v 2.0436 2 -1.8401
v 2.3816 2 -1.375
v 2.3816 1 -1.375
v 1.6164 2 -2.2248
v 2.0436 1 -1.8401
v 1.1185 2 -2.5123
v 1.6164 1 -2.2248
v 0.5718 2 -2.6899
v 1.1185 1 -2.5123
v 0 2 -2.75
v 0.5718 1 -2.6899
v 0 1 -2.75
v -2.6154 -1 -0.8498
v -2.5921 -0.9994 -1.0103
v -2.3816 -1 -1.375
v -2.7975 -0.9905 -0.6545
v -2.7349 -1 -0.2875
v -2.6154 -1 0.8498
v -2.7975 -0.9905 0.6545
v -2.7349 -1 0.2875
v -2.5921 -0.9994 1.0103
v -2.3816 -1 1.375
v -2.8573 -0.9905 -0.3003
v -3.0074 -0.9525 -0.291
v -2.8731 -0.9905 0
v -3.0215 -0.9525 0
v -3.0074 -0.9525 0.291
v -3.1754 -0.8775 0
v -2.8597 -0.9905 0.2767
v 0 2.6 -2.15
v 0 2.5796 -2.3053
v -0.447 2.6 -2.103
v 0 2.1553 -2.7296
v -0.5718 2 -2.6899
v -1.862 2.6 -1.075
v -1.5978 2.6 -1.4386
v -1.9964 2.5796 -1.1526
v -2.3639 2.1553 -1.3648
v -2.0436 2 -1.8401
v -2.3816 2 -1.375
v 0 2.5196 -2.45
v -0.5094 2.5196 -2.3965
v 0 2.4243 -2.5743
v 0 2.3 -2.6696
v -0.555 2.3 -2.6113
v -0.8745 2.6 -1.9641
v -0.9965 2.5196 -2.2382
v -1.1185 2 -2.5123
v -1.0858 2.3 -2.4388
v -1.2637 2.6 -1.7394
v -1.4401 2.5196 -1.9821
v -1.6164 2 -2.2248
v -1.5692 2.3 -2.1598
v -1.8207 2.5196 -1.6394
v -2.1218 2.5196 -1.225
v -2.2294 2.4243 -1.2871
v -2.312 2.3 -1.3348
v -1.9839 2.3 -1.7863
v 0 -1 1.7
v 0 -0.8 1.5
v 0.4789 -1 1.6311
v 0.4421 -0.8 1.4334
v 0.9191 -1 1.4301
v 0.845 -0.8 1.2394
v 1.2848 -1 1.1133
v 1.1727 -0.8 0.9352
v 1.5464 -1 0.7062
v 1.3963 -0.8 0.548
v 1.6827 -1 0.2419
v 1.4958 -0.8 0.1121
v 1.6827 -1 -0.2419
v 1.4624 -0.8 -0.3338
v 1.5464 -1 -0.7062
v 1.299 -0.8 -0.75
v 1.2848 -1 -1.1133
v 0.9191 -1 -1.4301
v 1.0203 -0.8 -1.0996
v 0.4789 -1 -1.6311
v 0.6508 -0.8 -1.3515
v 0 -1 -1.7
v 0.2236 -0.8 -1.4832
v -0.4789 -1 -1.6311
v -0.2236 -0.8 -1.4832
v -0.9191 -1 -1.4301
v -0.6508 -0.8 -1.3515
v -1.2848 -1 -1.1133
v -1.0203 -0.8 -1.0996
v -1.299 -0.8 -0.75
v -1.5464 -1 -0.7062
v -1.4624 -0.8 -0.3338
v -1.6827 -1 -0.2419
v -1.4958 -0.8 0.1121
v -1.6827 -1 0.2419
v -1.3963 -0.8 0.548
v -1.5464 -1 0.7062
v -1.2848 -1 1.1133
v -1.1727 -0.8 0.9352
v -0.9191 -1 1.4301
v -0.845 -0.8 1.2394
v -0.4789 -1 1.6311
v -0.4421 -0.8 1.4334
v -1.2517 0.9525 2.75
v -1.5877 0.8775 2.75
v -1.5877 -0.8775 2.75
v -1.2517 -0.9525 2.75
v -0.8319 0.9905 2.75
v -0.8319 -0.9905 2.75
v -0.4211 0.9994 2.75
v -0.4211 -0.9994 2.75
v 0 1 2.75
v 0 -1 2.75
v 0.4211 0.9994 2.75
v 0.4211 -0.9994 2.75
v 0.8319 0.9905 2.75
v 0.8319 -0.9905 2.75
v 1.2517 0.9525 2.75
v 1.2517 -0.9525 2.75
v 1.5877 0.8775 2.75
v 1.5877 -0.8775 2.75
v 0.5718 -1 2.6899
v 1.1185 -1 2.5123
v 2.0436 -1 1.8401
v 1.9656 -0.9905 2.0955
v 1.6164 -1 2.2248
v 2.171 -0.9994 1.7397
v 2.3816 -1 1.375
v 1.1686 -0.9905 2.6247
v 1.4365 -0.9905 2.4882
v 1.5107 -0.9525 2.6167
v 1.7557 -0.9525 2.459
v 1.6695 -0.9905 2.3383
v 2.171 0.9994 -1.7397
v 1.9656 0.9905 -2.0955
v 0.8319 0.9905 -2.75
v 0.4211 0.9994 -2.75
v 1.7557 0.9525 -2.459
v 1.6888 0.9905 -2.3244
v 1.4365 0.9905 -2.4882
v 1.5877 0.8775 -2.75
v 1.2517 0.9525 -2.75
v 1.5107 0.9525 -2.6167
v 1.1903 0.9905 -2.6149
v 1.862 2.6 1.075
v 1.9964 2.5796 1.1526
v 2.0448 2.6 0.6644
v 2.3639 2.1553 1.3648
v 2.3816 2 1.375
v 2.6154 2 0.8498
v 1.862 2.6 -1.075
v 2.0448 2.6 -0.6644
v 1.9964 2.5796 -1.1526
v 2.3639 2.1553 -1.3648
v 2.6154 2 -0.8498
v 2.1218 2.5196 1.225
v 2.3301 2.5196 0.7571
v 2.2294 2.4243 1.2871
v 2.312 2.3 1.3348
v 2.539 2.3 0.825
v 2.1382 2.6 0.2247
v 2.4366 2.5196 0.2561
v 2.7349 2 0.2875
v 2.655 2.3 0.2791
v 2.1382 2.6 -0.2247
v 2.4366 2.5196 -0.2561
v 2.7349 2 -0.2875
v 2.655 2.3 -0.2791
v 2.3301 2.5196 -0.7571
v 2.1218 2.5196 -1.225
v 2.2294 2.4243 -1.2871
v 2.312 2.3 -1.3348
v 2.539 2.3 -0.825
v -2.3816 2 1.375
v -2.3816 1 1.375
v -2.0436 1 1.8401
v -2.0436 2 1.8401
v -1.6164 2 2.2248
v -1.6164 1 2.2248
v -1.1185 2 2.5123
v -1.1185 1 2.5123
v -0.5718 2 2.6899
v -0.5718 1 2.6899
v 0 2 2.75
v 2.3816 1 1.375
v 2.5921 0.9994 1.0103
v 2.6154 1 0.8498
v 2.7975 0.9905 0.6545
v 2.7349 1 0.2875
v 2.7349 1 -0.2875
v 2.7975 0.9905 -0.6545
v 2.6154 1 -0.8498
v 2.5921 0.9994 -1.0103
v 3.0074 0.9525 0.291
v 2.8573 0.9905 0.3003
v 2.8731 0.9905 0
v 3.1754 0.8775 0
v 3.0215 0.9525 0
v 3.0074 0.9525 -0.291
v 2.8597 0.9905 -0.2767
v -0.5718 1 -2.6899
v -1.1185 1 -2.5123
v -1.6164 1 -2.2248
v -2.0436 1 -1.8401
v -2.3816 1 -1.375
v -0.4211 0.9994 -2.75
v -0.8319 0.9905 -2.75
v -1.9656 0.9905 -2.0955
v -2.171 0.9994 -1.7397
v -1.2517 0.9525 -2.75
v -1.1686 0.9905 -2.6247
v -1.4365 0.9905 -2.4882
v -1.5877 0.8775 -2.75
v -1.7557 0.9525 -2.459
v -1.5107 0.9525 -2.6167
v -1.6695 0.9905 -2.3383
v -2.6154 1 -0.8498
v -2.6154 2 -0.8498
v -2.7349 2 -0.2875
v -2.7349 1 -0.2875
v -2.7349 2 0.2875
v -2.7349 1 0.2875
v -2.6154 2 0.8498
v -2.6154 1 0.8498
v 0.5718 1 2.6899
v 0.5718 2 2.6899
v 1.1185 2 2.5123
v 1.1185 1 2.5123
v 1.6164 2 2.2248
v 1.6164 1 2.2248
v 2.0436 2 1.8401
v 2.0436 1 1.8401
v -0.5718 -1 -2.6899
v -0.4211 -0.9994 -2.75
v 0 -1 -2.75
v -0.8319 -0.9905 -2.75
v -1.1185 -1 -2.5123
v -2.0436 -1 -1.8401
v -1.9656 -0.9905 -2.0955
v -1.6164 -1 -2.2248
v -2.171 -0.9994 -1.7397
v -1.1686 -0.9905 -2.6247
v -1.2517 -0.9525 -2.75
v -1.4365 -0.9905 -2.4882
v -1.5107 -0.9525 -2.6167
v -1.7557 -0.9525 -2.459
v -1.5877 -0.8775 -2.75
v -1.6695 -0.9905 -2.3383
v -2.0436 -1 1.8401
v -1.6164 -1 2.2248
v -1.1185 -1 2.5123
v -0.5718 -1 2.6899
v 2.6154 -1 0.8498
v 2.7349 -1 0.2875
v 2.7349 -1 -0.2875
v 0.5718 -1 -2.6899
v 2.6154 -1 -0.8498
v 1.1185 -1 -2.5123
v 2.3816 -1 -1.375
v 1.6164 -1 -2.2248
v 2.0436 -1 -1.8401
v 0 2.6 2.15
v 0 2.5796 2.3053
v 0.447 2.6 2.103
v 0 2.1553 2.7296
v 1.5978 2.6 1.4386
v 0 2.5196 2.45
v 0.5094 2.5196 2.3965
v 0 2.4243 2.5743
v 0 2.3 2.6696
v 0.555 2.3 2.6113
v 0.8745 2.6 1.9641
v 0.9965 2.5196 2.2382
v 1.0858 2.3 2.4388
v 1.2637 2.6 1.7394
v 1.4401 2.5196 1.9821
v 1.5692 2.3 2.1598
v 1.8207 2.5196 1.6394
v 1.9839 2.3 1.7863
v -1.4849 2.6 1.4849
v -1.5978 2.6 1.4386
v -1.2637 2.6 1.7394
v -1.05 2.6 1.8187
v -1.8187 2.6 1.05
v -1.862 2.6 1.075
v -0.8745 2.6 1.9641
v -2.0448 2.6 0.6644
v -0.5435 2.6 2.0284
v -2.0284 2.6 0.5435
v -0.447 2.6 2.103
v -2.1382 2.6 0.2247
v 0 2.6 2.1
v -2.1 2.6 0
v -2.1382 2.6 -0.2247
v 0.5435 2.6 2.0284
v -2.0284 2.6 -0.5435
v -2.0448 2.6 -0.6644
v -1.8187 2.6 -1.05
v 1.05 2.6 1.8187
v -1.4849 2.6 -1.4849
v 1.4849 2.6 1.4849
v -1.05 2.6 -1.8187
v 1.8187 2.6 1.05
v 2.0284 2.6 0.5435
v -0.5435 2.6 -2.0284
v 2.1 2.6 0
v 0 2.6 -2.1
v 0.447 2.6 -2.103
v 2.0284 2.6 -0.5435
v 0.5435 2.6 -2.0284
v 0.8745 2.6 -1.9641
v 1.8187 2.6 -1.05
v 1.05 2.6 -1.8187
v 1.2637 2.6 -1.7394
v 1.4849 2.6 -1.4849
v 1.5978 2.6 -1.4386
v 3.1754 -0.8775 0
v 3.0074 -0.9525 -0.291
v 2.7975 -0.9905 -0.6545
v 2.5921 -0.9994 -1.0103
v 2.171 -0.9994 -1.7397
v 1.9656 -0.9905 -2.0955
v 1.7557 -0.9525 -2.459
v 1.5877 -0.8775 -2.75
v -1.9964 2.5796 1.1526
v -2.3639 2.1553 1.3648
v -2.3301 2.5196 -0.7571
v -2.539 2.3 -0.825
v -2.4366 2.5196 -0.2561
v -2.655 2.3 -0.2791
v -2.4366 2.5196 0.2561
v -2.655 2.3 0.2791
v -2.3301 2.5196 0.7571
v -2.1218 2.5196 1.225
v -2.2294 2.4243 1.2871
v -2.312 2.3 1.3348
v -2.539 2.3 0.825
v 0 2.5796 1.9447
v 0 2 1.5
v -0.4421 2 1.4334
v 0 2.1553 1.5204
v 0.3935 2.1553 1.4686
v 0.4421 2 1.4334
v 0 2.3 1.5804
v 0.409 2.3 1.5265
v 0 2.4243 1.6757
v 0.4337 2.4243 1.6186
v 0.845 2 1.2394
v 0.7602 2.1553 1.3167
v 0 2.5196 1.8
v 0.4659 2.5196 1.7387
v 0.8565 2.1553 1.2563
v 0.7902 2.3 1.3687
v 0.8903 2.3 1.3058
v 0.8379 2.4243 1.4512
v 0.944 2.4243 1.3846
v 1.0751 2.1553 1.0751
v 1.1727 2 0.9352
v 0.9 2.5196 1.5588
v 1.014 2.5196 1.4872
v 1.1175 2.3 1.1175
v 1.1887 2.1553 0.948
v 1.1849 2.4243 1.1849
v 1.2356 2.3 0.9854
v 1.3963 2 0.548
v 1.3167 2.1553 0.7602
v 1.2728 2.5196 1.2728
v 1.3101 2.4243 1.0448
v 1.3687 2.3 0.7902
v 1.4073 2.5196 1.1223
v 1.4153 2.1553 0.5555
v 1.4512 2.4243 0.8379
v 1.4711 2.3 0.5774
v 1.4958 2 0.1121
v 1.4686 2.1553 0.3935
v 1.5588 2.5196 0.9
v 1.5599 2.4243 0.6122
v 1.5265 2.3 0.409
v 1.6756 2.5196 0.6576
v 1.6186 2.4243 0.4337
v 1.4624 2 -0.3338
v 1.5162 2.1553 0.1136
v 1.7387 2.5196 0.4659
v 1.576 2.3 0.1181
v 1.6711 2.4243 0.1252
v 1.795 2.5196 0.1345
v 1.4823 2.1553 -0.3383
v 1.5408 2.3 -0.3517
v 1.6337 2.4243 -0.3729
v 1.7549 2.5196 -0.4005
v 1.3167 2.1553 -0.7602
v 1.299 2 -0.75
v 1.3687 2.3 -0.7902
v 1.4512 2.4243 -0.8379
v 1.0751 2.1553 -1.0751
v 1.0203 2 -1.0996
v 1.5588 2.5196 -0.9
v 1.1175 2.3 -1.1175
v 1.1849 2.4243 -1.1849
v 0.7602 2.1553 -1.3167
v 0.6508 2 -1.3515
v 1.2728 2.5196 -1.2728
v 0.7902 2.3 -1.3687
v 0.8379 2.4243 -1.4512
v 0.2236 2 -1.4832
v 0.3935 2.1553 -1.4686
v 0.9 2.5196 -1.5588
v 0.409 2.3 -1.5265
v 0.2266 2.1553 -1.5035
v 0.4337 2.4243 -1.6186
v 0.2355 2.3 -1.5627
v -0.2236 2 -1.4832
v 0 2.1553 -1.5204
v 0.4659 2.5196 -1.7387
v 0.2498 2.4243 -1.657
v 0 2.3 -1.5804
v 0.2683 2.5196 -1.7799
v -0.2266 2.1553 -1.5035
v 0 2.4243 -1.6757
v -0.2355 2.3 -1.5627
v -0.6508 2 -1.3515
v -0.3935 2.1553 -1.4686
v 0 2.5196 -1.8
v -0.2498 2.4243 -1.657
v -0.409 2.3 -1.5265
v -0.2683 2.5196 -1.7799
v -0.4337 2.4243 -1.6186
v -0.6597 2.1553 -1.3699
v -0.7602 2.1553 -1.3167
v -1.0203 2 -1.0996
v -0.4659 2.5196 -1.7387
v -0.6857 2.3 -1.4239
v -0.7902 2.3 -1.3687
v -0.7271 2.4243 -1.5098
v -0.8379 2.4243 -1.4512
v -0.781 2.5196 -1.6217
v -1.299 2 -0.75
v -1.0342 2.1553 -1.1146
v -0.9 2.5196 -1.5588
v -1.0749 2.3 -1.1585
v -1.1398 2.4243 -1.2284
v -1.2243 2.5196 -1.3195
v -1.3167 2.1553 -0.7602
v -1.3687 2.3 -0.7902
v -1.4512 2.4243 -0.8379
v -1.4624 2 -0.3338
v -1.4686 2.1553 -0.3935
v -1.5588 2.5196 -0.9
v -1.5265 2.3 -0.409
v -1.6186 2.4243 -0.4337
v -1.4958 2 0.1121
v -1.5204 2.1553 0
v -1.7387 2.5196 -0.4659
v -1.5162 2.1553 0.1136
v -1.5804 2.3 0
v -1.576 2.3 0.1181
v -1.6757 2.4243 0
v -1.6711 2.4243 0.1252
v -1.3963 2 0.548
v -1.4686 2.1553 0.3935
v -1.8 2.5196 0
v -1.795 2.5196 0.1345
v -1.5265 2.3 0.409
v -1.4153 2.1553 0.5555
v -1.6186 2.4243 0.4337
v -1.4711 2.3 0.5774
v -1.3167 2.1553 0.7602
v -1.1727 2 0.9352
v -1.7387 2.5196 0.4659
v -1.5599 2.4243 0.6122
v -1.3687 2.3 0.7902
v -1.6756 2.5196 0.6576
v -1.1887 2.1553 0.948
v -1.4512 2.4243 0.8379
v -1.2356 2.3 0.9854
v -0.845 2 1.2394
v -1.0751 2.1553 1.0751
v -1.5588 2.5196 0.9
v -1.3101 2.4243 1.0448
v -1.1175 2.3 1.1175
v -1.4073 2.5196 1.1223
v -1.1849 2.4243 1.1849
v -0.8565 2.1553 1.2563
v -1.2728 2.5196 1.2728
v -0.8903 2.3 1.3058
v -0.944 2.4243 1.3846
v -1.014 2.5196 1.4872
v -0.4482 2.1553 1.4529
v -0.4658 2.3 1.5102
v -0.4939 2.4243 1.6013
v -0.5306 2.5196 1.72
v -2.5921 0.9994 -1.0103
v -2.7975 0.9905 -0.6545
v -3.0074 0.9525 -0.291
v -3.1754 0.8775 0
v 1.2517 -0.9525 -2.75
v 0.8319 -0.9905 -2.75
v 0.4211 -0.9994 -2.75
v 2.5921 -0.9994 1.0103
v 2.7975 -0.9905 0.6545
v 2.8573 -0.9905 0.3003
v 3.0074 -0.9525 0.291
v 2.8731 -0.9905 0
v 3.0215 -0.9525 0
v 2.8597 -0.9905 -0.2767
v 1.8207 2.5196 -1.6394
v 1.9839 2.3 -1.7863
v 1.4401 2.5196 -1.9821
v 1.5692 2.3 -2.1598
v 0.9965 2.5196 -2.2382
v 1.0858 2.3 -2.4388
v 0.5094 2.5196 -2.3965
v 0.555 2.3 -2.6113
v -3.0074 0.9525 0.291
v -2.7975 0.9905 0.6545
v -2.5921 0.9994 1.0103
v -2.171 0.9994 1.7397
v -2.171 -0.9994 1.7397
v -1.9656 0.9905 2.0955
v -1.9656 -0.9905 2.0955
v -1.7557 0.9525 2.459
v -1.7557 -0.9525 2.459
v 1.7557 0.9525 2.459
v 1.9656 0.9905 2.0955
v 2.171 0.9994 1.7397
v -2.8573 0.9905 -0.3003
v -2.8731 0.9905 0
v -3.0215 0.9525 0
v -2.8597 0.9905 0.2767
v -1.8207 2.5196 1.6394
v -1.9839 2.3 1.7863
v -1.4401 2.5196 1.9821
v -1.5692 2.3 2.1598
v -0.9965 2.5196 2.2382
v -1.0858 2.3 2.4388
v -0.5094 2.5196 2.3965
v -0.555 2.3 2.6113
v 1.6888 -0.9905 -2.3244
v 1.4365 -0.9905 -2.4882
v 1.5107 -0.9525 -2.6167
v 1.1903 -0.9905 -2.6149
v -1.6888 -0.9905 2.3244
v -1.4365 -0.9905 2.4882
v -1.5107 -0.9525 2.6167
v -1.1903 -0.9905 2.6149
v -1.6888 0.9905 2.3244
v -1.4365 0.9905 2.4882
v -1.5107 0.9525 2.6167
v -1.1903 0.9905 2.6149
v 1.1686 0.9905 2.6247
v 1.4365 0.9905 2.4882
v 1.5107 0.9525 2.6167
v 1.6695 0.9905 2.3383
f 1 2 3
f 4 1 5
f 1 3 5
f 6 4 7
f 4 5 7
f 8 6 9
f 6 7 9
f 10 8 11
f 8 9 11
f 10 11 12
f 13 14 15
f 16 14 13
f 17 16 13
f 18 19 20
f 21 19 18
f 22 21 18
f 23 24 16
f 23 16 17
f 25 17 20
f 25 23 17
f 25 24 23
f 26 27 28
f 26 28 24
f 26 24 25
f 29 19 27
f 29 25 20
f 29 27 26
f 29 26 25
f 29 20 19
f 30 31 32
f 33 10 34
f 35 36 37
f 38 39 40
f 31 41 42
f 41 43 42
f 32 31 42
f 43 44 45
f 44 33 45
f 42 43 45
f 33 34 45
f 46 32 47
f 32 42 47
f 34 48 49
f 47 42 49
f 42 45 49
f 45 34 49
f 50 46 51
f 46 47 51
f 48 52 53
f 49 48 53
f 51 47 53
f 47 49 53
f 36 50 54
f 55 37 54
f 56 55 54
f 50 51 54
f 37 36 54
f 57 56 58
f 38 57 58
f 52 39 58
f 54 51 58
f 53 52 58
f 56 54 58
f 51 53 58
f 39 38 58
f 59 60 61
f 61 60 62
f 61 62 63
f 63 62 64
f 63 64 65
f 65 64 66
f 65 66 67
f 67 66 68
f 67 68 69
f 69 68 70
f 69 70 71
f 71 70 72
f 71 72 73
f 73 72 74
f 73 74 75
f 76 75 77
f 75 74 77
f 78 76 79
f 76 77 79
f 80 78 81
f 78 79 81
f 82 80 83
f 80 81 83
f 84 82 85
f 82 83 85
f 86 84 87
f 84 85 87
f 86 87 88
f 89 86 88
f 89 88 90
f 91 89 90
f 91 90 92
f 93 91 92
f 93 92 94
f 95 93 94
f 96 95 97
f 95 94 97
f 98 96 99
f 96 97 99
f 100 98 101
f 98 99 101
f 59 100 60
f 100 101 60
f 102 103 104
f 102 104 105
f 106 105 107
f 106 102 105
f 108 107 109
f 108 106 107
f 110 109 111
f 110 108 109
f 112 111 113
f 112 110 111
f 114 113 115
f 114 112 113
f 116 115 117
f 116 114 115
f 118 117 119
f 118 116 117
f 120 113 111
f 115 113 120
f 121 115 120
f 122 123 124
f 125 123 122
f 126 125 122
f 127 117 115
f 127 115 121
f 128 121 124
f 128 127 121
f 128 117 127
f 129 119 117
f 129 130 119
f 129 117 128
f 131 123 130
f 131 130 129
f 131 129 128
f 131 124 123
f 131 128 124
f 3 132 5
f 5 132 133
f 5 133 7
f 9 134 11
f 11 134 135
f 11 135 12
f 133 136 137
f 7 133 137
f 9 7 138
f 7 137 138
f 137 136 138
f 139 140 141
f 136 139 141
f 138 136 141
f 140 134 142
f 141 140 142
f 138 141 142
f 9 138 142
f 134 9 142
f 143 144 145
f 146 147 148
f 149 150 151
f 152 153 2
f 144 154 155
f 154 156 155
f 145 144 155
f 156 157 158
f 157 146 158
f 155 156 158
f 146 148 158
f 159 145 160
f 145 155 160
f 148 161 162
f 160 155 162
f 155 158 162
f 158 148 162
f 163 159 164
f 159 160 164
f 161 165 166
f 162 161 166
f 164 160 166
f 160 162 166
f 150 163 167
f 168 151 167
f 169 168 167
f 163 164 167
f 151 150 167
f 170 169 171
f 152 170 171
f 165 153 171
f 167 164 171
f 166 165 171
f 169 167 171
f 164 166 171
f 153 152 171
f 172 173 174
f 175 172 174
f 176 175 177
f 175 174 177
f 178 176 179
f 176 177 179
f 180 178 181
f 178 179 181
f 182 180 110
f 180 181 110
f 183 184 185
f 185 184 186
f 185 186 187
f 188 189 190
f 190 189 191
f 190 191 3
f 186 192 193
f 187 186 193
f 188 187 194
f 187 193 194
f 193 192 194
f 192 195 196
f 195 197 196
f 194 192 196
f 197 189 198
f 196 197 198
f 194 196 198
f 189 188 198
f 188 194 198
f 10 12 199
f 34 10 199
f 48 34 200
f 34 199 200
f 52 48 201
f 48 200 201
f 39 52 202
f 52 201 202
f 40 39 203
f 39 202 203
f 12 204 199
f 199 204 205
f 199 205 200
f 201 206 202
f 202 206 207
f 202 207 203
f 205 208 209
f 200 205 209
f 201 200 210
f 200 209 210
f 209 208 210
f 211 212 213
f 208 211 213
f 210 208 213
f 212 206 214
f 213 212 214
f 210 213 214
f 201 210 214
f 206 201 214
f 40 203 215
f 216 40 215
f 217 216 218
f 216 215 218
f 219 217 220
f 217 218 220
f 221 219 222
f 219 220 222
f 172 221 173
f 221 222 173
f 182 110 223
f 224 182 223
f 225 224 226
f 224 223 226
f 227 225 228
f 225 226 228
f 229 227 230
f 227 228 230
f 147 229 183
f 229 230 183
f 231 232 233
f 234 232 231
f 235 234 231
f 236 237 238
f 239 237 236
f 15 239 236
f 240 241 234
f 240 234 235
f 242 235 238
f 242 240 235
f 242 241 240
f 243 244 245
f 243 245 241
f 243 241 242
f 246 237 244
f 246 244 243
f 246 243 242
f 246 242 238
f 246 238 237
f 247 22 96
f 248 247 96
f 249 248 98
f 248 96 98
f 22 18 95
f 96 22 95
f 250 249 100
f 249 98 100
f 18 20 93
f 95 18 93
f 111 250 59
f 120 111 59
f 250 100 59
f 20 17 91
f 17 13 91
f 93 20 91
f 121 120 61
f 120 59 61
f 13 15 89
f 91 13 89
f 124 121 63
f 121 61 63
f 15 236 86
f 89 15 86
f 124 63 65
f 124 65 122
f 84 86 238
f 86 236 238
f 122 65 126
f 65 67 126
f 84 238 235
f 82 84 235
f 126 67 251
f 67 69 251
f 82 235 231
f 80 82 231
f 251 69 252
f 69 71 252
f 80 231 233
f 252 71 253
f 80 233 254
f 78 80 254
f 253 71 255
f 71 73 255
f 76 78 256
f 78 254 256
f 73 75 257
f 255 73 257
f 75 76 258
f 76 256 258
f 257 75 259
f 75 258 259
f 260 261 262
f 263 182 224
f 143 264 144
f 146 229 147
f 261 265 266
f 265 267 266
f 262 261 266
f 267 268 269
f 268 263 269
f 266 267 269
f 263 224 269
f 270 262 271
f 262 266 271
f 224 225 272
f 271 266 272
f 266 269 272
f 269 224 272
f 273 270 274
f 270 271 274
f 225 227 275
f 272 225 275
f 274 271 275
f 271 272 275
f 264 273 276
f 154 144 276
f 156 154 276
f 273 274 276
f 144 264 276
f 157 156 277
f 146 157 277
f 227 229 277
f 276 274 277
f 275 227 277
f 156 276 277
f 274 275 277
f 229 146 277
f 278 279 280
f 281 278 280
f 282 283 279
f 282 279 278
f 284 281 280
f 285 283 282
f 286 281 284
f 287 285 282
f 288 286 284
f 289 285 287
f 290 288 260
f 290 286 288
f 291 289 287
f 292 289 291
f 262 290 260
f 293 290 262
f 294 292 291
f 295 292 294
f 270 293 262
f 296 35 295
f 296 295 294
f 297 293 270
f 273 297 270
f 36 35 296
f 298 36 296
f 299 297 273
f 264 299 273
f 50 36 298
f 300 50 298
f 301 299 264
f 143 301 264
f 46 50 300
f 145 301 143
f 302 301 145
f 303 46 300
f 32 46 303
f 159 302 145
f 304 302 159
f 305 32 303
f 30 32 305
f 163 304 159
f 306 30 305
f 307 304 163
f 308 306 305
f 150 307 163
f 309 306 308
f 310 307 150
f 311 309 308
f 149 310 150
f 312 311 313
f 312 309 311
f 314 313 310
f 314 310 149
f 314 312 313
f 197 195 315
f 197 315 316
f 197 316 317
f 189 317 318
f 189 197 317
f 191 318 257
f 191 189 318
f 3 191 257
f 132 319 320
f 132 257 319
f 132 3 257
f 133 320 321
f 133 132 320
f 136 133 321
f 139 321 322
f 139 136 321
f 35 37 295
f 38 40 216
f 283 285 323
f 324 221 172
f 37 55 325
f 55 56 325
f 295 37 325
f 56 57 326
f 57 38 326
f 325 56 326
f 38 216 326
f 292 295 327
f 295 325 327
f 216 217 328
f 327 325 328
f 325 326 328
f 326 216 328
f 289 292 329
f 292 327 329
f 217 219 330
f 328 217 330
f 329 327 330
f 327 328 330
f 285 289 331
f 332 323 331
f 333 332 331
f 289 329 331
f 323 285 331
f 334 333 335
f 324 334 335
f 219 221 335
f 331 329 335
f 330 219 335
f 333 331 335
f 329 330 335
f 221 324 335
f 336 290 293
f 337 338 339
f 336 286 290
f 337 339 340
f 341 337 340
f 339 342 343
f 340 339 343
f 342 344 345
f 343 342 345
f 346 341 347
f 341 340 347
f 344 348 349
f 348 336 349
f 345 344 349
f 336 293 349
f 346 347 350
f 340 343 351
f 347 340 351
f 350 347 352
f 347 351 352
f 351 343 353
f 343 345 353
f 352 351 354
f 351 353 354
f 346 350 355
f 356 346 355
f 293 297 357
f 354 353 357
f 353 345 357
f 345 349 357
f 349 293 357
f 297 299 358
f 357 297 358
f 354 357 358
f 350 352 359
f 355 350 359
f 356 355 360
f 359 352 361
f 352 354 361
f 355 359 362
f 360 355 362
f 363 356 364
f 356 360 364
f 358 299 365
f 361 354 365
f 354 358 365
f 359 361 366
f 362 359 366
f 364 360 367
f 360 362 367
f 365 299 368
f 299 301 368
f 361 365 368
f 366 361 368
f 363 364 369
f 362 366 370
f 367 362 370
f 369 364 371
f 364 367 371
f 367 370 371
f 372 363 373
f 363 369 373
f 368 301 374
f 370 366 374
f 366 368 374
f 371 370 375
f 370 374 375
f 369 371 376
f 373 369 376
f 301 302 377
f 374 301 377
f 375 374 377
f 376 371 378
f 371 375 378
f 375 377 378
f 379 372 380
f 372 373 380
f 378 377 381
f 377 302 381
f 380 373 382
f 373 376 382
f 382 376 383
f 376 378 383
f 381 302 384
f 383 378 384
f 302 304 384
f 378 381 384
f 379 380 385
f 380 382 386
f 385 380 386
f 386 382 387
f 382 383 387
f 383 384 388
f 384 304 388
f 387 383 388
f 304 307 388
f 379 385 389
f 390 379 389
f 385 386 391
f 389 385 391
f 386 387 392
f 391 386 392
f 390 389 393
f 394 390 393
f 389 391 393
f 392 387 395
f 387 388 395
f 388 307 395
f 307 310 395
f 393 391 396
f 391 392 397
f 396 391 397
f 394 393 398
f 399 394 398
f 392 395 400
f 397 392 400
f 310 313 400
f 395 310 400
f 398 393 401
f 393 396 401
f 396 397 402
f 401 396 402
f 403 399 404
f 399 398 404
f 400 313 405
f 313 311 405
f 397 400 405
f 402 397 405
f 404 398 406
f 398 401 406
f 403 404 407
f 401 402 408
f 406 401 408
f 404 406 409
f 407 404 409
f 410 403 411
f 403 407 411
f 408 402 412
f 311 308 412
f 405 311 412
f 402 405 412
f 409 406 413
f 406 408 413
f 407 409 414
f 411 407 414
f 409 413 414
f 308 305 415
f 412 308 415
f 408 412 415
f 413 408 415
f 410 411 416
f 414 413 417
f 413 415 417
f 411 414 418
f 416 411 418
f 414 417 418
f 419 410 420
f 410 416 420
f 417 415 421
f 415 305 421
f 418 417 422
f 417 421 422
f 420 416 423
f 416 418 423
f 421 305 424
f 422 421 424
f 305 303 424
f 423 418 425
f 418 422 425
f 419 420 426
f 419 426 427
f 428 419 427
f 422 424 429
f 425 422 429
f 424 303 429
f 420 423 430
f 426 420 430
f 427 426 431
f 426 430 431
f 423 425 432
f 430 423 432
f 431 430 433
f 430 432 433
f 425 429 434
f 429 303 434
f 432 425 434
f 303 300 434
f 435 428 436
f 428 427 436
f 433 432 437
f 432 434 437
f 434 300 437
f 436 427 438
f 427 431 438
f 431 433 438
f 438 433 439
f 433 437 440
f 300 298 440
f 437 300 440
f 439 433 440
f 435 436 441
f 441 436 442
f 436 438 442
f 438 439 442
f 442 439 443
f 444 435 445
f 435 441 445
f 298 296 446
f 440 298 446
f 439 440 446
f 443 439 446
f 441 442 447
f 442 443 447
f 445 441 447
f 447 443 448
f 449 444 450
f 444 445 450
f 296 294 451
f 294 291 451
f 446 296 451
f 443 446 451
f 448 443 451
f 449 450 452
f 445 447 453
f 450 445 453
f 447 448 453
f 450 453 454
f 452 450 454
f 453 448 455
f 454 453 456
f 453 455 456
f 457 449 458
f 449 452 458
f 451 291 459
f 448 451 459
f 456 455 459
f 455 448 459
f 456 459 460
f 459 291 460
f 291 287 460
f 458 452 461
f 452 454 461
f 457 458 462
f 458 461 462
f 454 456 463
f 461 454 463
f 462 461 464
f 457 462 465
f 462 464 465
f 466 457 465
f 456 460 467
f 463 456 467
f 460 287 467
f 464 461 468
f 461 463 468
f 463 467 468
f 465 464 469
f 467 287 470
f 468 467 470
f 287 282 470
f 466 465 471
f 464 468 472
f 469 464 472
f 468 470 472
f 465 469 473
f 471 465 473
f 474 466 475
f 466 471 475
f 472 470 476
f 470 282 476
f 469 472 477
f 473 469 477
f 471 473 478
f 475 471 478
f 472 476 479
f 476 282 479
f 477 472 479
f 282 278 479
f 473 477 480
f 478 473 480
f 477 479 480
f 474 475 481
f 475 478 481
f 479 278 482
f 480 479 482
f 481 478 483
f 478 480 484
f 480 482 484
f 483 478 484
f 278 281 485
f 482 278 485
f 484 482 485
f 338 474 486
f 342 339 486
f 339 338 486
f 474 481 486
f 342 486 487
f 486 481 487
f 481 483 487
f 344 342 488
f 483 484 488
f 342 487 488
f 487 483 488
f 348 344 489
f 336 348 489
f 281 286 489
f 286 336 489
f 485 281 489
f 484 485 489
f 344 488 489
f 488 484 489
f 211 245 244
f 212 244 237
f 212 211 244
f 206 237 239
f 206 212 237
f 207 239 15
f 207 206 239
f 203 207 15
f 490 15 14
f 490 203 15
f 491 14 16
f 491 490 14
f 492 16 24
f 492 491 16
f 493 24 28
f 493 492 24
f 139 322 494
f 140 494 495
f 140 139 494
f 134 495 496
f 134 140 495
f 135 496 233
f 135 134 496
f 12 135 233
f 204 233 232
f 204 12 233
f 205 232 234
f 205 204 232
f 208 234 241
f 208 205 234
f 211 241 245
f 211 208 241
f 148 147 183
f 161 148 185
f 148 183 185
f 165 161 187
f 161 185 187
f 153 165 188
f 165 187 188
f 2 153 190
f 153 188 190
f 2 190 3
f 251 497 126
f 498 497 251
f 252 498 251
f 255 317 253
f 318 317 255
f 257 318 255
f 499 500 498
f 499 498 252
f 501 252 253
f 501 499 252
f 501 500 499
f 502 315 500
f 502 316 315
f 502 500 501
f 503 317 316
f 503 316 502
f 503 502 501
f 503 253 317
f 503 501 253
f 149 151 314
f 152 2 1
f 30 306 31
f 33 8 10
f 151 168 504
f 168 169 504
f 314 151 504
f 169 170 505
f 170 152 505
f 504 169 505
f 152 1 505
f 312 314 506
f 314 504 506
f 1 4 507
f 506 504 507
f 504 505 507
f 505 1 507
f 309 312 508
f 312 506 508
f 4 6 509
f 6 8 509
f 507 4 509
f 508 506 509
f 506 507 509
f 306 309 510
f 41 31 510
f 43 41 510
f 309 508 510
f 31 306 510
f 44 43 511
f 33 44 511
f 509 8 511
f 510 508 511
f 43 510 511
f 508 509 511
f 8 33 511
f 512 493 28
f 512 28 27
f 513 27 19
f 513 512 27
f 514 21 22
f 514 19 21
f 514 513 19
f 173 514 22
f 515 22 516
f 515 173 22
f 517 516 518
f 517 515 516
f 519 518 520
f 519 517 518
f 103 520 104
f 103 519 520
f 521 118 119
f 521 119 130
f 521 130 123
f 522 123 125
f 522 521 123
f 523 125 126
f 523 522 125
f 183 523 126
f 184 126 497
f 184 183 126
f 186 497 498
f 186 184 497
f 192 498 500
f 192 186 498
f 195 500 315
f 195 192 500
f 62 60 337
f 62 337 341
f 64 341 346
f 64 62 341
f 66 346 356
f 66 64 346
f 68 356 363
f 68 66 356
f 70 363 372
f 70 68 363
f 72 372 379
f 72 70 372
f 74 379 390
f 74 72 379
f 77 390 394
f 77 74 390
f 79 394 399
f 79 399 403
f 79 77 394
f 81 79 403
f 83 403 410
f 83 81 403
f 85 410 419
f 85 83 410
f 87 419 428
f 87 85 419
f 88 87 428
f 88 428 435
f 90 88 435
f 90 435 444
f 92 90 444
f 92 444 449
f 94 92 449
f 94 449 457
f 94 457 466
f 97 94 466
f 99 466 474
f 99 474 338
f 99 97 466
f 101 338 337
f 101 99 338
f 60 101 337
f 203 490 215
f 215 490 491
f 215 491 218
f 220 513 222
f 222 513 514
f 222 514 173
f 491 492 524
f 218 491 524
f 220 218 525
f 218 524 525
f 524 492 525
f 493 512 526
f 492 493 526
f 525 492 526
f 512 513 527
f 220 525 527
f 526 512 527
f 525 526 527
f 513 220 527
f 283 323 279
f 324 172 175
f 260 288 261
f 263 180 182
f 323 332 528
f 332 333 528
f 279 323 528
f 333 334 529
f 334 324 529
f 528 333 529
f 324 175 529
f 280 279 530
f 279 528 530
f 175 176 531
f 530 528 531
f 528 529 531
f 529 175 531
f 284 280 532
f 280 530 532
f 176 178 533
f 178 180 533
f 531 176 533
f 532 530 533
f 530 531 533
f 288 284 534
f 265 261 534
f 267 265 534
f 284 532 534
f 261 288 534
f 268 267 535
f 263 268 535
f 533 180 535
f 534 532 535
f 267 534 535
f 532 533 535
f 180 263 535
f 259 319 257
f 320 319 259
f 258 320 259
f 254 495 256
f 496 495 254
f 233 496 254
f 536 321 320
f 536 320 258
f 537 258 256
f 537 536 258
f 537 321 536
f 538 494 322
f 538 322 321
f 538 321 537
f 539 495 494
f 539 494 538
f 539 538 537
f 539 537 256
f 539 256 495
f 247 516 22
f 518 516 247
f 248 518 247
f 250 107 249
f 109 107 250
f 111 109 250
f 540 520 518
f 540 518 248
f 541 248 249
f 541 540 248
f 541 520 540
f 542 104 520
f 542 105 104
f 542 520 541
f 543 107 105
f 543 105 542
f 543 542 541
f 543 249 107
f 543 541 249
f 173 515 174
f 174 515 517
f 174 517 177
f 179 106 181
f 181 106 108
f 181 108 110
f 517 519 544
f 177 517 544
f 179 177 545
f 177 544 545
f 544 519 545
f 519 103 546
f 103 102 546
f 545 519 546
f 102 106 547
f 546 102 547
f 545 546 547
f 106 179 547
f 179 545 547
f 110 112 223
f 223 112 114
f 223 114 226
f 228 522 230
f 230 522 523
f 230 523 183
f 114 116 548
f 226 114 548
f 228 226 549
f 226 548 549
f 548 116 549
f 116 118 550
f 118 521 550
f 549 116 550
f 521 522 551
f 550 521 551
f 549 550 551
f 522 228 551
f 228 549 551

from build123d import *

# Parameters (mm, degrees)
SKETCH1_R           = 1.5
BOSS_EXTRUDE1_DEPTH = 1
BOSS_EXTRUDE2_START = -2
SKETCH3_R           = 1.5
BOSS_EXTRUDE2_DEPTH = 3.6
CHAMFER1_SIZE       = 0.2
FILLET1_R           = 0.6


with BuildPart() as part:
    # Sketch1 → Boss-Extrude1 (new, symmetric)
    with BuildSketch(Plane(origin=(0, 0, 0), x_dir=(1, 0, 0), z_dir=(0, 1, 0))):
        Polygon((3.175426481, 0), (1.58771324, 2.75), (-1.58771324, 2.75), (-3.175426481, 0), (-1.58771324, -2.75), (1.58771324, -2.75), align=None)
        with Locations(Location((0, 0, 0), (0, 0, 270))):
            Circle(SKETCH1_R, mode=Mode.SUBTRACT)
    extrude(amount=BOSS_EXTRUDE1_DEPTH, both=True)

    # Sketch2 → Cut-Revolve1 (revolve, cut)
    with BuildSketch(Plane.XY):
        with BuildLine():
            Line((-3.55, -0.2), (-3.55, -1))
            Line((-3.55, -1), (-2.75, -1))
            ThreePointArc((-2.75, -1), (-3.315685425, -0.765685425), (-3.55, -0.2))
        make_face()
    cut_revolve1 = revolve(axis=Axis((0, 0, 0), (0, 1, 0)), mode=Mode.SUBTRACT)

    # Mirror2: Cut-Revolve1 across plane
    add(cut_revolve1.mirror(Plane.ZX), mode=Mode.SUBTRACT)

    # Sketch3 → Boss-Extrude2 (add)
    with BuildSketch(Plane(origin=(0, 1, 0), x_dir=(1, 0, 0), z_dir=(0, 1, 0)).offset(BOSS_EXTRUDE2_START)):
        with BuildLine():
            ThreePointArc((-2.38156986, -1.375), (-1.375, -2.38156986), (0, -2.75))
            ThreePointArc((0, -2.75), (1.375, -2.38156986), (2.38156986, -1.375))
            ThreePointArc((2.38156986, -1.375), (2.75, 0), (2.38156986, 1.375))
            ThreePointArc((2.38156986, 1.375), (1.375, 2.38156986), (0, 2.75))
            ThreePointArc((0, 2.75), (-1.375, 2.38156986), (-2.38156986, 1.375))
            ThreePointArc((-2.38156986, 1.375), (-2.75, 0), (-2.38156986, -1.375))
        make_face()
        with Locations(Location((0, 0, 0), (0, 0, 270))):
            Circle(SKETCH3_R, mode=Mode.SUBTRACT)
    extrude(amount=BOSS_EXTRUDE2_DEPTH)

    # Chamfer1
    chamfer1_edges = [part.edges().sort_by_distance(p)[0] for p in [
        (0, -1, -1.5),
    ]]
    chamfer(chamfer1_edges, length=CHAMFER1_SIZE)

    # Fillet1
    fillet1_edges = [part.edges().sort_by_distance(p)[0] for p in [
        (0, 2.6, 2.75),
        (0, 2.6, -1.5),
    ]]
    fillet(fillet1_edges, radius=FILLET1_R)


solid = part.part
